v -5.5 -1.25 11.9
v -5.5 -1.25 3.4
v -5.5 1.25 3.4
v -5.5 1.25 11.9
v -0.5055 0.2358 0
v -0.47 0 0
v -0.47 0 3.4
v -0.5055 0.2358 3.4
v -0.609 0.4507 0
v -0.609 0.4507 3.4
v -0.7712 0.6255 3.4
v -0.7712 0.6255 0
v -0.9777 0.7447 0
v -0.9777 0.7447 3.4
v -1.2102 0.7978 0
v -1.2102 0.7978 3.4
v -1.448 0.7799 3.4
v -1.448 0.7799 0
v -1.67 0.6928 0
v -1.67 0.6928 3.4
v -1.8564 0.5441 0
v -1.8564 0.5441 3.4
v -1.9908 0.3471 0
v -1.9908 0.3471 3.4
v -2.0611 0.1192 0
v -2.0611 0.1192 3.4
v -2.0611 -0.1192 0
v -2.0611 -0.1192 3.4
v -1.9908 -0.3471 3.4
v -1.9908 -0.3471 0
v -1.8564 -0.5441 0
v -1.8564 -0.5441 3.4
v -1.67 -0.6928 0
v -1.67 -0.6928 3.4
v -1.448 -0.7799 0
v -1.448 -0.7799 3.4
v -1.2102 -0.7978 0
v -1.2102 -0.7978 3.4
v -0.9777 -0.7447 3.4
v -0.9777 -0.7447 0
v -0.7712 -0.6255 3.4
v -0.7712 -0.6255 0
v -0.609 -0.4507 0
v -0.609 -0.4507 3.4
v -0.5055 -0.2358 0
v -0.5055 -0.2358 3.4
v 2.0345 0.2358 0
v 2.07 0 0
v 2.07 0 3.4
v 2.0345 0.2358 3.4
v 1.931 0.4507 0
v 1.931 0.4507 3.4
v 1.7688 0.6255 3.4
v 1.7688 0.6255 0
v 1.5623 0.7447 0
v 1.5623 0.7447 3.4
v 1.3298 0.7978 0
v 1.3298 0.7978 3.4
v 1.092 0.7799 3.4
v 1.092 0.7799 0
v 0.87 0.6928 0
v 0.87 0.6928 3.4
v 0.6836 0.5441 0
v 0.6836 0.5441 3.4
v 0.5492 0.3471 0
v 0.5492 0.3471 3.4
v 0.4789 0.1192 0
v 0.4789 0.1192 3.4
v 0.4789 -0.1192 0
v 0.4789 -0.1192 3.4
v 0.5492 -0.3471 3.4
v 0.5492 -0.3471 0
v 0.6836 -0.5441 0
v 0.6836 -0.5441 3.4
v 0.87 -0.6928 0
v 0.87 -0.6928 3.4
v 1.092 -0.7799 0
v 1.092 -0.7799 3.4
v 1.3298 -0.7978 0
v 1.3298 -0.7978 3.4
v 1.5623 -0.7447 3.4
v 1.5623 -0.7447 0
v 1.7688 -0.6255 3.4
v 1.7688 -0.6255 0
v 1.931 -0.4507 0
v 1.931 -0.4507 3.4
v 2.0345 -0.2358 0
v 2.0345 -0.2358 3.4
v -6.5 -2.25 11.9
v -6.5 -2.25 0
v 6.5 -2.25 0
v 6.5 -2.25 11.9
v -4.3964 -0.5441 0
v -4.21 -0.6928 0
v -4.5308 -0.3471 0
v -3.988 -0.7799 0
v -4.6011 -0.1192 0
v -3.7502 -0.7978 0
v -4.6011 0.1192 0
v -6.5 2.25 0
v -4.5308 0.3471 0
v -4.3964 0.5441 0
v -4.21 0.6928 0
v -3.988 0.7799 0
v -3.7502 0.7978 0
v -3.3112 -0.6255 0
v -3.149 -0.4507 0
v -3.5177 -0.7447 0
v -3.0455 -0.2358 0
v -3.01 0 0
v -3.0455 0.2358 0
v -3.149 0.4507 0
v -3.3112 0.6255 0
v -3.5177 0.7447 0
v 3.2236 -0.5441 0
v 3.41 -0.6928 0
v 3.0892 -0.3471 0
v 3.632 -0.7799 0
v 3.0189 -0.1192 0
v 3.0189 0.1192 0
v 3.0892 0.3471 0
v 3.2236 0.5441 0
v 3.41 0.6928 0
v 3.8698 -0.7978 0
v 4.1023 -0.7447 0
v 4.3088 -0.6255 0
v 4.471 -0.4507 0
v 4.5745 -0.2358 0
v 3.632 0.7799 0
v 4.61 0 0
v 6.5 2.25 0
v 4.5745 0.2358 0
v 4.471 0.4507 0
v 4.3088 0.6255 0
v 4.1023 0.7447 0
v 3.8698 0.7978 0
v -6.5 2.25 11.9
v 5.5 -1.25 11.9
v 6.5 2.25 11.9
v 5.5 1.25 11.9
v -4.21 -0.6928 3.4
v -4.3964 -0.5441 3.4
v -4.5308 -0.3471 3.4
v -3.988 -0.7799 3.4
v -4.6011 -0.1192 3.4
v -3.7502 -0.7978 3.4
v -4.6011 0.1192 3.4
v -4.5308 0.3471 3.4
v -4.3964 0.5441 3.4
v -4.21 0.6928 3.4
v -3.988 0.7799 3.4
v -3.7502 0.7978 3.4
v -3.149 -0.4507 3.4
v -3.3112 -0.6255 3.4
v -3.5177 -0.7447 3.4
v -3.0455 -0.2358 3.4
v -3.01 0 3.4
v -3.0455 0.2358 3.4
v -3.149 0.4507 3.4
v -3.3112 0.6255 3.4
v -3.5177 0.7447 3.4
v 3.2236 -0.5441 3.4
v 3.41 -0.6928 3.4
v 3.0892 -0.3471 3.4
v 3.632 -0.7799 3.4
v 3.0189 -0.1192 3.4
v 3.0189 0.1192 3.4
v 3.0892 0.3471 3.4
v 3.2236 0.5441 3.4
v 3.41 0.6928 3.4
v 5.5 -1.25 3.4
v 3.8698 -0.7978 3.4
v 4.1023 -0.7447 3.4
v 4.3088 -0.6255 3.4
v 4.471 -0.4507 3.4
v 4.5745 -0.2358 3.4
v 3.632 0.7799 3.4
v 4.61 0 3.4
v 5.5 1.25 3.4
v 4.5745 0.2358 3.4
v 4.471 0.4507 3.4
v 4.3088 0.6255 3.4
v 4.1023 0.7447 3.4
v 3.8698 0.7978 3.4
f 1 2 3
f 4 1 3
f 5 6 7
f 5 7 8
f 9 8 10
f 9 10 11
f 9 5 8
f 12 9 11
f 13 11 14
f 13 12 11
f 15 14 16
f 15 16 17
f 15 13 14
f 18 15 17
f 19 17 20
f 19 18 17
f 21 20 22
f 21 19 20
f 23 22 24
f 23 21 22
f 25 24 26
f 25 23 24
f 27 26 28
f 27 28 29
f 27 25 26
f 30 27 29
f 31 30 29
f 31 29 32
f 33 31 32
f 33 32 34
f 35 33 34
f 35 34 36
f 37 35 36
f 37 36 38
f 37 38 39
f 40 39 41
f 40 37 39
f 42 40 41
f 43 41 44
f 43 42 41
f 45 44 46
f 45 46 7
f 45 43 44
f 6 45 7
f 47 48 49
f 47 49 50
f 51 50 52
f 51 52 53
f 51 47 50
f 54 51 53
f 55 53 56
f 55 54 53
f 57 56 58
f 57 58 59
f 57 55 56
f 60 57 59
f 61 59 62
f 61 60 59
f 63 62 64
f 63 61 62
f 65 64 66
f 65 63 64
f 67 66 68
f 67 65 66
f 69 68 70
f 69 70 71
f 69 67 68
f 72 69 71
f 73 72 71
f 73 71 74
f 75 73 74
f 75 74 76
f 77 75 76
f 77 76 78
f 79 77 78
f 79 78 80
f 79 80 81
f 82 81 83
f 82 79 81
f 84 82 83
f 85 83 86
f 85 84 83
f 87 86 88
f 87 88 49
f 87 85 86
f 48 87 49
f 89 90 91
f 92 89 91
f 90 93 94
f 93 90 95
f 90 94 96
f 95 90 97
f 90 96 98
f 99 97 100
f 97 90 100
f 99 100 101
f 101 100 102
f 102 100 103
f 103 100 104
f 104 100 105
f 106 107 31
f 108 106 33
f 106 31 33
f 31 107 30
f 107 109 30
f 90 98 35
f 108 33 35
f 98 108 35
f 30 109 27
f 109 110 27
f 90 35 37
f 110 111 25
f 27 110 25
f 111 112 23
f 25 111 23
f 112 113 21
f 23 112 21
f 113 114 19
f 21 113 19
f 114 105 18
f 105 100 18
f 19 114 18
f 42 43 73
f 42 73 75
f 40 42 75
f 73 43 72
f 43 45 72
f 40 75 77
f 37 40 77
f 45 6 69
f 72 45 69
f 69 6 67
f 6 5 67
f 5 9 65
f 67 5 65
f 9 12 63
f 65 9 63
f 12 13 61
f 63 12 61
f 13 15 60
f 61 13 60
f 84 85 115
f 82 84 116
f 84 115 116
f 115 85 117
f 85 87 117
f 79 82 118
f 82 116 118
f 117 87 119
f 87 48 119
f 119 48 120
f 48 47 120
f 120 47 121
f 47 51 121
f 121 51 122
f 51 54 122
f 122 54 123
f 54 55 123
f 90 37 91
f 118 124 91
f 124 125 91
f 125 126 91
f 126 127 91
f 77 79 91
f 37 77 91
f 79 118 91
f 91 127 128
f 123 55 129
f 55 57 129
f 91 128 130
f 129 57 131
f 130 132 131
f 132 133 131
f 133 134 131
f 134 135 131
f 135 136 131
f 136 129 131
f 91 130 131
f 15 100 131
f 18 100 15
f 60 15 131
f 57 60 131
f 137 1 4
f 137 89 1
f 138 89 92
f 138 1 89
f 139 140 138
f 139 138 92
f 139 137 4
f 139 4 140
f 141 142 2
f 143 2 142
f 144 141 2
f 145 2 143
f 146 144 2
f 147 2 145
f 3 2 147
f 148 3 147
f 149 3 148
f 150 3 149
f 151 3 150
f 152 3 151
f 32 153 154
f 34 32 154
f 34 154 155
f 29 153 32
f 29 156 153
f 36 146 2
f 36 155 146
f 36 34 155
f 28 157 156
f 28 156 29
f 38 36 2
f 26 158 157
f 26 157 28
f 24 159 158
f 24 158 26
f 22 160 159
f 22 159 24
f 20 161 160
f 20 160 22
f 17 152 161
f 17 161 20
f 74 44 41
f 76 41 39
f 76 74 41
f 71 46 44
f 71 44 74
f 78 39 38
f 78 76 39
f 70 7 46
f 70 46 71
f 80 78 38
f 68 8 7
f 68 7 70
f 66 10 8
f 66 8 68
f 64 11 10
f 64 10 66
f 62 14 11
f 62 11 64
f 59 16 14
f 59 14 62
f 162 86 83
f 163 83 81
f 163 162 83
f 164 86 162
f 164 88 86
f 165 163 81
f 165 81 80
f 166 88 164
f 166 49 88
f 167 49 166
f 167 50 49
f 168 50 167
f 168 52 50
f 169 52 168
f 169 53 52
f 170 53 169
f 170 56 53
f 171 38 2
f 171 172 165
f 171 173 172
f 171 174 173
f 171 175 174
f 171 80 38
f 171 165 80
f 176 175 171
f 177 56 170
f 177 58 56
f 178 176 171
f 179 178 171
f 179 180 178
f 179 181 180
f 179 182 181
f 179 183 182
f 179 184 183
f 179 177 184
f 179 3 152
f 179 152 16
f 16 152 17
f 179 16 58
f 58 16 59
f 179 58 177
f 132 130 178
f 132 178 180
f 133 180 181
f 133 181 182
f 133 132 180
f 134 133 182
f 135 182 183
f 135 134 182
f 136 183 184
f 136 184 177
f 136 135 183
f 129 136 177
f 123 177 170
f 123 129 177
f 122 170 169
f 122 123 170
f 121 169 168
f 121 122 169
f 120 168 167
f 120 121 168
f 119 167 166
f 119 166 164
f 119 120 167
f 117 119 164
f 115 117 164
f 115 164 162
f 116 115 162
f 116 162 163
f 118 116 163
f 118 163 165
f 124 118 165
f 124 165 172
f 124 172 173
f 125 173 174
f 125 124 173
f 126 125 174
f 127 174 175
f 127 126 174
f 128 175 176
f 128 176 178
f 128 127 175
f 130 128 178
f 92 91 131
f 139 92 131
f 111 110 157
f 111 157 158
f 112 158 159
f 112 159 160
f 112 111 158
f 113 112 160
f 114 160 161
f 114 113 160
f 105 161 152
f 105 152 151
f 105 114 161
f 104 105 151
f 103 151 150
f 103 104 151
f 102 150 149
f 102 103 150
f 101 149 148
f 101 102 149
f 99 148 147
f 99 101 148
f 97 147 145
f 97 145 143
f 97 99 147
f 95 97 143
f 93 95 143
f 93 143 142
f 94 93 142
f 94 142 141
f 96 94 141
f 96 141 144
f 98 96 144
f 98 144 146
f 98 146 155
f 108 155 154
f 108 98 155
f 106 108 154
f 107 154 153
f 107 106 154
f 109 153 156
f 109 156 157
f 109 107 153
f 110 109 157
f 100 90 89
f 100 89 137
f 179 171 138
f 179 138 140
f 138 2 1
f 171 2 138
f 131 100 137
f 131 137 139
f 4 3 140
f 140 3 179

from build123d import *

# Parameters (mm, degrees)
SKETCH_W      = 11
SKETCH_H      = 2.5
SKETCH_R      = 0.8
PAD_DEPTH     = 3.4
SKETCH001_W   = 13
SKETCH001_H   = 4.5
SKETCH001_W_2 = 11
SKETCH001_H_2 = 2.5
PAD001_DEPTH  = 11.9


with BuildPart() as part:
    # Sketch → Pad (new body)
    with BuildSketch(Plane.XY):
        Rectangle(SKETCH_W, SKETCH_H)
        with Locations((-1.27, 0)):
            Circle(SKETCH_R, mode=Mode.SUBTRACT)
        with Locations((1.27, 0)):
            Circle(SKETCH_R, mode=Mode.SUBTRACT)
        with Locations((3.81, 0)):
            Circle(SKETCH_R, mode=Mode.SUBTRACT)
        with Locations((-3.81, 0)):
            Circle(SKETCH_R, mode=Mode.SUBTRACT)
    extrude(amount=PAD_DEPTH)

    # Sketch001 → Pad001 (join)
    with BuildSketch(Plane.XY):
        Rectangle(SKETCH001_W, SKETCH001_H)
        Rectangle(SKETCH001_W_2, SKETCH001_H_2, mode=Mode.SUBTRACT)
    extrude(amount=PAD001_DEPTH)


solid = part.part
